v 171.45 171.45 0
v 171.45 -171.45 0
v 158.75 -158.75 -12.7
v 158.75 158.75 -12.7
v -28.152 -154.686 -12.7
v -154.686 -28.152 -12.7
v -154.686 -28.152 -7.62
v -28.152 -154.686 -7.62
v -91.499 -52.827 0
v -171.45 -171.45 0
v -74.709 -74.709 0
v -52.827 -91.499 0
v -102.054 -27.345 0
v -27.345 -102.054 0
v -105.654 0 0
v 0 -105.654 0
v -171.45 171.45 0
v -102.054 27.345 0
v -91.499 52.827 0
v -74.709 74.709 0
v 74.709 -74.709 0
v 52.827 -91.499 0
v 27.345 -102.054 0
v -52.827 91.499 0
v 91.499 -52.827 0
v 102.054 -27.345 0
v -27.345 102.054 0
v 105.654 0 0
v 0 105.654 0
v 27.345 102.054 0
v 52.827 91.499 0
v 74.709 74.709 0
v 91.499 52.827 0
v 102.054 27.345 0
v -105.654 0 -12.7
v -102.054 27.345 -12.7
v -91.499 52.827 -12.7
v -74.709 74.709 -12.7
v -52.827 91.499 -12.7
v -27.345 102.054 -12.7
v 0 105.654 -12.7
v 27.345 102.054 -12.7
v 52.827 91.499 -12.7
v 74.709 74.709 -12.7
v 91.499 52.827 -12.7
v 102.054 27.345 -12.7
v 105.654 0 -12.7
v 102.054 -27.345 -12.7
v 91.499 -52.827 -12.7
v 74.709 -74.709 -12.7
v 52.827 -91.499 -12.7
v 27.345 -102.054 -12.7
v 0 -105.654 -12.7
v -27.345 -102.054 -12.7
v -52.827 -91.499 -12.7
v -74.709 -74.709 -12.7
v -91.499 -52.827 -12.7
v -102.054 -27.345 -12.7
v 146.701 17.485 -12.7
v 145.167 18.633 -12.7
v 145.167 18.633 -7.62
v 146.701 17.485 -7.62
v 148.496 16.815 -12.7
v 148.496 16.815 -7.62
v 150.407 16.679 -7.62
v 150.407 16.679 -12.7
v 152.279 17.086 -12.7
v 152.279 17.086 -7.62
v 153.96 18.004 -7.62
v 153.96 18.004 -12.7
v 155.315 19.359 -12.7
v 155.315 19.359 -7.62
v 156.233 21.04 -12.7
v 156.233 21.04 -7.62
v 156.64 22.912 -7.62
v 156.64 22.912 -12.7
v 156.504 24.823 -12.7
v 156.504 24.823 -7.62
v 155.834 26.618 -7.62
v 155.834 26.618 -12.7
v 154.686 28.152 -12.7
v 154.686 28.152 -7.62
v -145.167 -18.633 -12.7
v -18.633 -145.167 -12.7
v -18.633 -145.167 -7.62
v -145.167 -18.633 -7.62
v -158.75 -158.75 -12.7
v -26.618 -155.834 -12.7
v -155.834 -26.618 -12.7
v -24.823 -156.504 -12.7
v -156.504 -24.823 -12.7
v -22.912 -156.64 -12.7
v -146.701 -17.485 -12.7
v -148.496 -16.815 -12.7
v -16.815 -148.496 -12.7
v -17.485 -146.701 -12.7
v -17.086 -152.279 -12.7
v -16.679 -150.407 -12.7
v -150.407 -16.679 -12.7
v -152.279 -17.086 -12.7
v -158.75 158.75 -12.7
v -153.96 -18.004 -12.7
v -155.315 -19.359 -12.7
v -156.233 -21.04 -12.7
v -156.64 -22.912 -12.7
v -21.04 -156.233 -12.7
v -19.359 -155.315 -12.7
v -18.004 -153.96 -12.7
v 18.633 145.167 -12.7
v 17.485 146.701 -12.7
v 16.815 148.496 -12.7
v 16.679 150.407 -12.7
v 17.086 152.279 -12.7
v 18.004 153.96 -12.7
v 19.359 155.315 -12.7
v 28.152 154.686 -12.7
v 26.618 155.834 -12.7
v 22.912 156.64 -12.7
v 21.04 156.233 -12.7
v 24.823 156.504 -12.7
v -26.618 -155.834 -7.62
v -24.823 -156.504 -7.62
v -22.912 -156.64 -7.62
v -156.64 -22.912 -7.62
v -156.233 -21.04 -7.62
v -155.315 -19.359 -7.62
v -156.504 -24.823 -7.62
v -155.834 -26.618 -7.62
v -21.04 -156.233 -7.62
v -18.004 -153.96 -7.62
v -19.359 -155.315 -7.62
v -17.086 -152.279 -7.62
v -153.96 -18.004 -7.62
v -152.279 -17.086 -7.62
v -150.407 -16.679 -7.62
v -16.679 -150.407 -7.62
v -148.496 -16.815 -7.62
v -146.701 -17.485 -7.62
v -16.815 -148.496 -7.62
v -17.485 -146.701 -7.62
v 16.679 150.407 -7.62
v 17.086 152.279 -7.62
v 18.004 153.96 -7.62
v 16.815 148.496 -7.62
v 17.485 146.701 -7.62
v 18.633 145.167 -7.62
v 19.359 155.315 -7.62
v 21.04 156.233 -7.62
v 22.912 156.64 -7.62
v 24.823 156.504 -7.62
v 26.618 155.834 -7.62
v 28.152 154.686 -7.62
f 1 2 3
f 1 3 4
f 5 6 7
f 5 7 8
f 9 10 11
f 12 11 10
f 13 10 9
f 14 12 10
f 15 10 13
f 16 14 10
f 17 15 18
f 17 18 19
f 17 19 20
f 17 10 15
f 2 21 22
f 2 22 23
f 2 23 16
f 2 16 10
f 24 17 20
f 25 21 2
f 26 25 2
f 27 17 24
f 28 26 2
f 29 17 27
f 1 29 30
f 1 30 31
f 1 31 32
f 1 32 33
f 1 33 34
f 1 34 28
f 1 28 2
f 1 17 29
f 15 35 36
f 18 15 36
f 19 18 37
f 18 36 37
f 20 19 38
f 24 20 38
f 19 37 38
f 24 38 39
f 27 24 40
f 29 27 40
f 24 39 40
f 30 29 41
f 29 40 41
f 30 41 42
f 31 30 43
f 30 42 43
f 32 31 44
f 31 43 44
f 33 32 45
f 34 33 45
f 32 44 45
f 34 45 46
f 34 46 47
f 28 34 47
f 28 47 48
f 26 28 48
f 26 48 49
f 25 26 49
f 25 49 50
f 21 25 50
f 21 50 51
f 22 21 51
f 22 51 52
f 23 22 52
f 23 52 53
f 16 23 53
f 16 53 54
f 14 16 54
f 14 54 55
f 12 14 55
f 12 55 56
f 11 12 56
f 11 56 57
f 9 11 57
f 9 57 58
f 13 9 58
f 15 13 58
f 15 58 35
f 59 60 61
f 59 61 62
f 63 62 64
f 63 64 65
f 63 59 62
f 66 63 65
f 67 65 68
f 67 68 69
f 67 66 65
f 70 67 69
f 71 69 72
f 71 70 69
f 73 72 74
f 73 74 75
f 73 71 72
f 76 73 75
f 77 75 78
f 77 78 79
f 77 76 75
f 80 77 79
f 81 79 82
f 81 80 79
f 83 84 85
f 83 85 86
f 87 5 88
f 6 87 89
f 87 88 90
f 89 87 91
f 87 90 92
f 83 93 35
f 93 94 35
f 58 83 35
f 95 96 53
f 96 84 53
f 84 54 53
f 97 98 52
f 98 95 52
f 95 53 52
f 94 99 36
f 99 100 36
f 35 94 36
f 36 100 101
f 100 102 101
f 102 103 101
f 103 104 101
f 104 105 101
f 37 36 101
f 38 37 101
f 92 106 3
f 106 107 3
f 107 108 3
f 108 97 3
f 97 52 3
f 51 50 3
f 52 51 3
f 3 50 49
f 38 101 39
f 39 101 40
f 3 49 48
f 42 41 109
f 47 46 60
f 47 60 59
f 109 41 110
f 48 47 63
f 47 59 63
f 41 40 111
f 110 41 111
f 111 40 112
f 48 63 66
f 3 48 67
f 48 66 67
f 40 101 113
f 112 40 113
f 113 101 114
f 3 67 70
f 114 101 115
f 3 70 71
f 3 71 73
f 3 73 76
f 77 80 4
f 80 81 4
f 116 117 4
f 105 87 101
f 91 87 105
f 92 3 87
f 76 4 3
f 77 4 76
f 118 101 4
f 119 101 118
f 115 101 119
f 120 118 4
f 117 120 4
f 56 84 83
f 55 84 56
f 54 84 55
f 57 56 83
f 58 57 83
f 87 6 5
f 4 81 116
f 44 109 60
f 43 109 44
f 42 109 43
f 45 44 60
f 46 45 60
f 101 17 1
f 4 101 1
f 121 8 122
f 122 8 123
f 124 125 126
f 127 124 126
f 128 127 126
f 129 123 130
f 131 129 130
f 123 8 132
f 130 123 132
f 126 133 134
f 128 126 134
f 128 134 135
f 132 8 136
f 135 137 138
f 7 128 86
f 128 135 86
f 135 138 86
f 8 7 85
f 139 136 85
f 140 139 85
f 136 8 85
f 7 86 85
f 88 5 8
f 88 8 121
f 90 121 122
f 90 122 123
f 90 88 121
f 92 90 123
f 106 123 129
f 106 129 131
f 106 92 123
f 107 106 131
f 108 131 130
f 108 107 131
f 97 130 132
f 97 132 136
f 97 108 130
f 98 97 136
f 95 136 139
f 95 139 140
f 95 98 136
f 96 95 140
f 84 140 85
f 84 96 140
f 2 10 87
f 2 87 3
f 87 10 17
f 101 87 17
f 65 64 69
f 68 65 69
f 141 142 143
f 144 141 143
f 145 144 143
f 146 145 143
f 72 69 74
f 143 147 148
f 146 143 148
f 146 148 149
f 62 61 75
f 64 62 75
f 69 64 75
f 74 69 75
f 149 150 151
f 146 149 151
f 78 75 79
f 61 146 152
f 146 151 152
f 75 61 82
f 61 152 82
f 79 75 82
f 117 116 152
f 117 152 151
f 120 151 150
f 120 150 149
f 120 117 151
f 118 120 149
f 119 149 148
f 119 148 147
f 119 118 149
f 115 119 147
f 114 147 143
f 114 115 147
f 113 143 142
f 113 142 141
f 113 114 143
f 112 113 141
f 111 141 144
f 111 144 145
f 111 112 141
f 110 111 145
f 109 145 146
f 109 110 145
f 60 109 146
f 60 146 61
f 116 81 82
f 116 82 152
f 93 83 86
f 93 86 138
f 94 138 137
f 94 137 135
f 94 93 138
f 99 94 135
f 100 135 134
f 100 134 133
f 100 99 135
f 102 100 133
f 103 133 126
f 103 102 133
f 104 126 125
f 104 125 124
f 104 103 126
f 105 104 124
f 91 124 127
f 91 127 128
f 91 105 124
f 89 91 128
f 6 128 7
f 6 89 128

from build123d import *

# Parameters (mm, degrees)
SKETCH1_W           = 342.9
SKETCH1_H           = 342.9
BOSS_EXTRUDE1_DEPTH = 12.7
DRAFT1_ANGLE        = -45
SKETCH2_R           = 105.653774547
CUT_EXTRUDE1_DEPTH  = 243.799289538
CUT_EXTRUDE2_DEPTH  = 5.08


with BuildPart() as part:
    # Sketch1 → Boss-Extrude1 (new body)
    with BuildSketch(Plane.XY):
        Rectangle(SKETCH1_W, SKETCH1_H)
    extrude(amount=-BOSS_EXTRUDE1_DEPTH)

    # Draft1
    draft1_faces = [part.faces().sort_by_distance(p)[0] for p in [
        (-171.45, 0, -6.35),
        (0, -171.45, -6.35),
        (171.45, 0, -6.35),
        (0, 171.45, -6.35),
    ]]
    draft(draft1_faces, Plane.XY, DRAFT1_ANGLE)

    # Sketch2 → Cut-Extrude1 (cut, through all)
    with BuildSketch(Plane(origin=(0, 0, -12.7), x_dir=(-1, 0, 0), z_dir=(0, 0, -1))):
        Circle(SKETCH2_R)
    extrude(amount=-CUT_EXTRUDE1_DEPTH, mode=Mode.SUBTRACT)

    # Sketch3 → Cut-Extrude2 (cut)
    with BuildSketch(Plane(origin=(0, 0, -12.7), x_dir=(-1, 0, 0), z_dir=(0, 0, -1))):
        with BuildLine():
            Line((18.632943137, -145.166928512), (145.166928512, -18.632943137))
            ThreePointArc((145.166928512, -18.632943137), (154.686, -18.632943137), (154.686, -28.152014625))
            Line((154.686, -28.152014625), (28.152014625, -154.686))
            ThreePointArc((28.152014625, -154.686), (18.632943137, -154.686), (18.632943137, -145.166928512))
        make_face()
        with BuildLine():
            Line((-154.686, 28.152014625), (-28.152014625, 154.686))
            ThreePointArc((-28.152014625, 154.686), (-18.632943137, 154.686), (-18.632943137, 145.166928512))
            Line((-18.632943137, 145.166928512), (-145.166928512, 18.632943137))
            ThreePointArc((-145.166928512, 18.632943137), (-154.686, 18.632943137), (-154.686, 28.152014625))
        make_face()
    extrude(amount=-CUT_EXTRUDE2_DEPTH, mode=Mode.SUBTRACT)


solid = part.part
